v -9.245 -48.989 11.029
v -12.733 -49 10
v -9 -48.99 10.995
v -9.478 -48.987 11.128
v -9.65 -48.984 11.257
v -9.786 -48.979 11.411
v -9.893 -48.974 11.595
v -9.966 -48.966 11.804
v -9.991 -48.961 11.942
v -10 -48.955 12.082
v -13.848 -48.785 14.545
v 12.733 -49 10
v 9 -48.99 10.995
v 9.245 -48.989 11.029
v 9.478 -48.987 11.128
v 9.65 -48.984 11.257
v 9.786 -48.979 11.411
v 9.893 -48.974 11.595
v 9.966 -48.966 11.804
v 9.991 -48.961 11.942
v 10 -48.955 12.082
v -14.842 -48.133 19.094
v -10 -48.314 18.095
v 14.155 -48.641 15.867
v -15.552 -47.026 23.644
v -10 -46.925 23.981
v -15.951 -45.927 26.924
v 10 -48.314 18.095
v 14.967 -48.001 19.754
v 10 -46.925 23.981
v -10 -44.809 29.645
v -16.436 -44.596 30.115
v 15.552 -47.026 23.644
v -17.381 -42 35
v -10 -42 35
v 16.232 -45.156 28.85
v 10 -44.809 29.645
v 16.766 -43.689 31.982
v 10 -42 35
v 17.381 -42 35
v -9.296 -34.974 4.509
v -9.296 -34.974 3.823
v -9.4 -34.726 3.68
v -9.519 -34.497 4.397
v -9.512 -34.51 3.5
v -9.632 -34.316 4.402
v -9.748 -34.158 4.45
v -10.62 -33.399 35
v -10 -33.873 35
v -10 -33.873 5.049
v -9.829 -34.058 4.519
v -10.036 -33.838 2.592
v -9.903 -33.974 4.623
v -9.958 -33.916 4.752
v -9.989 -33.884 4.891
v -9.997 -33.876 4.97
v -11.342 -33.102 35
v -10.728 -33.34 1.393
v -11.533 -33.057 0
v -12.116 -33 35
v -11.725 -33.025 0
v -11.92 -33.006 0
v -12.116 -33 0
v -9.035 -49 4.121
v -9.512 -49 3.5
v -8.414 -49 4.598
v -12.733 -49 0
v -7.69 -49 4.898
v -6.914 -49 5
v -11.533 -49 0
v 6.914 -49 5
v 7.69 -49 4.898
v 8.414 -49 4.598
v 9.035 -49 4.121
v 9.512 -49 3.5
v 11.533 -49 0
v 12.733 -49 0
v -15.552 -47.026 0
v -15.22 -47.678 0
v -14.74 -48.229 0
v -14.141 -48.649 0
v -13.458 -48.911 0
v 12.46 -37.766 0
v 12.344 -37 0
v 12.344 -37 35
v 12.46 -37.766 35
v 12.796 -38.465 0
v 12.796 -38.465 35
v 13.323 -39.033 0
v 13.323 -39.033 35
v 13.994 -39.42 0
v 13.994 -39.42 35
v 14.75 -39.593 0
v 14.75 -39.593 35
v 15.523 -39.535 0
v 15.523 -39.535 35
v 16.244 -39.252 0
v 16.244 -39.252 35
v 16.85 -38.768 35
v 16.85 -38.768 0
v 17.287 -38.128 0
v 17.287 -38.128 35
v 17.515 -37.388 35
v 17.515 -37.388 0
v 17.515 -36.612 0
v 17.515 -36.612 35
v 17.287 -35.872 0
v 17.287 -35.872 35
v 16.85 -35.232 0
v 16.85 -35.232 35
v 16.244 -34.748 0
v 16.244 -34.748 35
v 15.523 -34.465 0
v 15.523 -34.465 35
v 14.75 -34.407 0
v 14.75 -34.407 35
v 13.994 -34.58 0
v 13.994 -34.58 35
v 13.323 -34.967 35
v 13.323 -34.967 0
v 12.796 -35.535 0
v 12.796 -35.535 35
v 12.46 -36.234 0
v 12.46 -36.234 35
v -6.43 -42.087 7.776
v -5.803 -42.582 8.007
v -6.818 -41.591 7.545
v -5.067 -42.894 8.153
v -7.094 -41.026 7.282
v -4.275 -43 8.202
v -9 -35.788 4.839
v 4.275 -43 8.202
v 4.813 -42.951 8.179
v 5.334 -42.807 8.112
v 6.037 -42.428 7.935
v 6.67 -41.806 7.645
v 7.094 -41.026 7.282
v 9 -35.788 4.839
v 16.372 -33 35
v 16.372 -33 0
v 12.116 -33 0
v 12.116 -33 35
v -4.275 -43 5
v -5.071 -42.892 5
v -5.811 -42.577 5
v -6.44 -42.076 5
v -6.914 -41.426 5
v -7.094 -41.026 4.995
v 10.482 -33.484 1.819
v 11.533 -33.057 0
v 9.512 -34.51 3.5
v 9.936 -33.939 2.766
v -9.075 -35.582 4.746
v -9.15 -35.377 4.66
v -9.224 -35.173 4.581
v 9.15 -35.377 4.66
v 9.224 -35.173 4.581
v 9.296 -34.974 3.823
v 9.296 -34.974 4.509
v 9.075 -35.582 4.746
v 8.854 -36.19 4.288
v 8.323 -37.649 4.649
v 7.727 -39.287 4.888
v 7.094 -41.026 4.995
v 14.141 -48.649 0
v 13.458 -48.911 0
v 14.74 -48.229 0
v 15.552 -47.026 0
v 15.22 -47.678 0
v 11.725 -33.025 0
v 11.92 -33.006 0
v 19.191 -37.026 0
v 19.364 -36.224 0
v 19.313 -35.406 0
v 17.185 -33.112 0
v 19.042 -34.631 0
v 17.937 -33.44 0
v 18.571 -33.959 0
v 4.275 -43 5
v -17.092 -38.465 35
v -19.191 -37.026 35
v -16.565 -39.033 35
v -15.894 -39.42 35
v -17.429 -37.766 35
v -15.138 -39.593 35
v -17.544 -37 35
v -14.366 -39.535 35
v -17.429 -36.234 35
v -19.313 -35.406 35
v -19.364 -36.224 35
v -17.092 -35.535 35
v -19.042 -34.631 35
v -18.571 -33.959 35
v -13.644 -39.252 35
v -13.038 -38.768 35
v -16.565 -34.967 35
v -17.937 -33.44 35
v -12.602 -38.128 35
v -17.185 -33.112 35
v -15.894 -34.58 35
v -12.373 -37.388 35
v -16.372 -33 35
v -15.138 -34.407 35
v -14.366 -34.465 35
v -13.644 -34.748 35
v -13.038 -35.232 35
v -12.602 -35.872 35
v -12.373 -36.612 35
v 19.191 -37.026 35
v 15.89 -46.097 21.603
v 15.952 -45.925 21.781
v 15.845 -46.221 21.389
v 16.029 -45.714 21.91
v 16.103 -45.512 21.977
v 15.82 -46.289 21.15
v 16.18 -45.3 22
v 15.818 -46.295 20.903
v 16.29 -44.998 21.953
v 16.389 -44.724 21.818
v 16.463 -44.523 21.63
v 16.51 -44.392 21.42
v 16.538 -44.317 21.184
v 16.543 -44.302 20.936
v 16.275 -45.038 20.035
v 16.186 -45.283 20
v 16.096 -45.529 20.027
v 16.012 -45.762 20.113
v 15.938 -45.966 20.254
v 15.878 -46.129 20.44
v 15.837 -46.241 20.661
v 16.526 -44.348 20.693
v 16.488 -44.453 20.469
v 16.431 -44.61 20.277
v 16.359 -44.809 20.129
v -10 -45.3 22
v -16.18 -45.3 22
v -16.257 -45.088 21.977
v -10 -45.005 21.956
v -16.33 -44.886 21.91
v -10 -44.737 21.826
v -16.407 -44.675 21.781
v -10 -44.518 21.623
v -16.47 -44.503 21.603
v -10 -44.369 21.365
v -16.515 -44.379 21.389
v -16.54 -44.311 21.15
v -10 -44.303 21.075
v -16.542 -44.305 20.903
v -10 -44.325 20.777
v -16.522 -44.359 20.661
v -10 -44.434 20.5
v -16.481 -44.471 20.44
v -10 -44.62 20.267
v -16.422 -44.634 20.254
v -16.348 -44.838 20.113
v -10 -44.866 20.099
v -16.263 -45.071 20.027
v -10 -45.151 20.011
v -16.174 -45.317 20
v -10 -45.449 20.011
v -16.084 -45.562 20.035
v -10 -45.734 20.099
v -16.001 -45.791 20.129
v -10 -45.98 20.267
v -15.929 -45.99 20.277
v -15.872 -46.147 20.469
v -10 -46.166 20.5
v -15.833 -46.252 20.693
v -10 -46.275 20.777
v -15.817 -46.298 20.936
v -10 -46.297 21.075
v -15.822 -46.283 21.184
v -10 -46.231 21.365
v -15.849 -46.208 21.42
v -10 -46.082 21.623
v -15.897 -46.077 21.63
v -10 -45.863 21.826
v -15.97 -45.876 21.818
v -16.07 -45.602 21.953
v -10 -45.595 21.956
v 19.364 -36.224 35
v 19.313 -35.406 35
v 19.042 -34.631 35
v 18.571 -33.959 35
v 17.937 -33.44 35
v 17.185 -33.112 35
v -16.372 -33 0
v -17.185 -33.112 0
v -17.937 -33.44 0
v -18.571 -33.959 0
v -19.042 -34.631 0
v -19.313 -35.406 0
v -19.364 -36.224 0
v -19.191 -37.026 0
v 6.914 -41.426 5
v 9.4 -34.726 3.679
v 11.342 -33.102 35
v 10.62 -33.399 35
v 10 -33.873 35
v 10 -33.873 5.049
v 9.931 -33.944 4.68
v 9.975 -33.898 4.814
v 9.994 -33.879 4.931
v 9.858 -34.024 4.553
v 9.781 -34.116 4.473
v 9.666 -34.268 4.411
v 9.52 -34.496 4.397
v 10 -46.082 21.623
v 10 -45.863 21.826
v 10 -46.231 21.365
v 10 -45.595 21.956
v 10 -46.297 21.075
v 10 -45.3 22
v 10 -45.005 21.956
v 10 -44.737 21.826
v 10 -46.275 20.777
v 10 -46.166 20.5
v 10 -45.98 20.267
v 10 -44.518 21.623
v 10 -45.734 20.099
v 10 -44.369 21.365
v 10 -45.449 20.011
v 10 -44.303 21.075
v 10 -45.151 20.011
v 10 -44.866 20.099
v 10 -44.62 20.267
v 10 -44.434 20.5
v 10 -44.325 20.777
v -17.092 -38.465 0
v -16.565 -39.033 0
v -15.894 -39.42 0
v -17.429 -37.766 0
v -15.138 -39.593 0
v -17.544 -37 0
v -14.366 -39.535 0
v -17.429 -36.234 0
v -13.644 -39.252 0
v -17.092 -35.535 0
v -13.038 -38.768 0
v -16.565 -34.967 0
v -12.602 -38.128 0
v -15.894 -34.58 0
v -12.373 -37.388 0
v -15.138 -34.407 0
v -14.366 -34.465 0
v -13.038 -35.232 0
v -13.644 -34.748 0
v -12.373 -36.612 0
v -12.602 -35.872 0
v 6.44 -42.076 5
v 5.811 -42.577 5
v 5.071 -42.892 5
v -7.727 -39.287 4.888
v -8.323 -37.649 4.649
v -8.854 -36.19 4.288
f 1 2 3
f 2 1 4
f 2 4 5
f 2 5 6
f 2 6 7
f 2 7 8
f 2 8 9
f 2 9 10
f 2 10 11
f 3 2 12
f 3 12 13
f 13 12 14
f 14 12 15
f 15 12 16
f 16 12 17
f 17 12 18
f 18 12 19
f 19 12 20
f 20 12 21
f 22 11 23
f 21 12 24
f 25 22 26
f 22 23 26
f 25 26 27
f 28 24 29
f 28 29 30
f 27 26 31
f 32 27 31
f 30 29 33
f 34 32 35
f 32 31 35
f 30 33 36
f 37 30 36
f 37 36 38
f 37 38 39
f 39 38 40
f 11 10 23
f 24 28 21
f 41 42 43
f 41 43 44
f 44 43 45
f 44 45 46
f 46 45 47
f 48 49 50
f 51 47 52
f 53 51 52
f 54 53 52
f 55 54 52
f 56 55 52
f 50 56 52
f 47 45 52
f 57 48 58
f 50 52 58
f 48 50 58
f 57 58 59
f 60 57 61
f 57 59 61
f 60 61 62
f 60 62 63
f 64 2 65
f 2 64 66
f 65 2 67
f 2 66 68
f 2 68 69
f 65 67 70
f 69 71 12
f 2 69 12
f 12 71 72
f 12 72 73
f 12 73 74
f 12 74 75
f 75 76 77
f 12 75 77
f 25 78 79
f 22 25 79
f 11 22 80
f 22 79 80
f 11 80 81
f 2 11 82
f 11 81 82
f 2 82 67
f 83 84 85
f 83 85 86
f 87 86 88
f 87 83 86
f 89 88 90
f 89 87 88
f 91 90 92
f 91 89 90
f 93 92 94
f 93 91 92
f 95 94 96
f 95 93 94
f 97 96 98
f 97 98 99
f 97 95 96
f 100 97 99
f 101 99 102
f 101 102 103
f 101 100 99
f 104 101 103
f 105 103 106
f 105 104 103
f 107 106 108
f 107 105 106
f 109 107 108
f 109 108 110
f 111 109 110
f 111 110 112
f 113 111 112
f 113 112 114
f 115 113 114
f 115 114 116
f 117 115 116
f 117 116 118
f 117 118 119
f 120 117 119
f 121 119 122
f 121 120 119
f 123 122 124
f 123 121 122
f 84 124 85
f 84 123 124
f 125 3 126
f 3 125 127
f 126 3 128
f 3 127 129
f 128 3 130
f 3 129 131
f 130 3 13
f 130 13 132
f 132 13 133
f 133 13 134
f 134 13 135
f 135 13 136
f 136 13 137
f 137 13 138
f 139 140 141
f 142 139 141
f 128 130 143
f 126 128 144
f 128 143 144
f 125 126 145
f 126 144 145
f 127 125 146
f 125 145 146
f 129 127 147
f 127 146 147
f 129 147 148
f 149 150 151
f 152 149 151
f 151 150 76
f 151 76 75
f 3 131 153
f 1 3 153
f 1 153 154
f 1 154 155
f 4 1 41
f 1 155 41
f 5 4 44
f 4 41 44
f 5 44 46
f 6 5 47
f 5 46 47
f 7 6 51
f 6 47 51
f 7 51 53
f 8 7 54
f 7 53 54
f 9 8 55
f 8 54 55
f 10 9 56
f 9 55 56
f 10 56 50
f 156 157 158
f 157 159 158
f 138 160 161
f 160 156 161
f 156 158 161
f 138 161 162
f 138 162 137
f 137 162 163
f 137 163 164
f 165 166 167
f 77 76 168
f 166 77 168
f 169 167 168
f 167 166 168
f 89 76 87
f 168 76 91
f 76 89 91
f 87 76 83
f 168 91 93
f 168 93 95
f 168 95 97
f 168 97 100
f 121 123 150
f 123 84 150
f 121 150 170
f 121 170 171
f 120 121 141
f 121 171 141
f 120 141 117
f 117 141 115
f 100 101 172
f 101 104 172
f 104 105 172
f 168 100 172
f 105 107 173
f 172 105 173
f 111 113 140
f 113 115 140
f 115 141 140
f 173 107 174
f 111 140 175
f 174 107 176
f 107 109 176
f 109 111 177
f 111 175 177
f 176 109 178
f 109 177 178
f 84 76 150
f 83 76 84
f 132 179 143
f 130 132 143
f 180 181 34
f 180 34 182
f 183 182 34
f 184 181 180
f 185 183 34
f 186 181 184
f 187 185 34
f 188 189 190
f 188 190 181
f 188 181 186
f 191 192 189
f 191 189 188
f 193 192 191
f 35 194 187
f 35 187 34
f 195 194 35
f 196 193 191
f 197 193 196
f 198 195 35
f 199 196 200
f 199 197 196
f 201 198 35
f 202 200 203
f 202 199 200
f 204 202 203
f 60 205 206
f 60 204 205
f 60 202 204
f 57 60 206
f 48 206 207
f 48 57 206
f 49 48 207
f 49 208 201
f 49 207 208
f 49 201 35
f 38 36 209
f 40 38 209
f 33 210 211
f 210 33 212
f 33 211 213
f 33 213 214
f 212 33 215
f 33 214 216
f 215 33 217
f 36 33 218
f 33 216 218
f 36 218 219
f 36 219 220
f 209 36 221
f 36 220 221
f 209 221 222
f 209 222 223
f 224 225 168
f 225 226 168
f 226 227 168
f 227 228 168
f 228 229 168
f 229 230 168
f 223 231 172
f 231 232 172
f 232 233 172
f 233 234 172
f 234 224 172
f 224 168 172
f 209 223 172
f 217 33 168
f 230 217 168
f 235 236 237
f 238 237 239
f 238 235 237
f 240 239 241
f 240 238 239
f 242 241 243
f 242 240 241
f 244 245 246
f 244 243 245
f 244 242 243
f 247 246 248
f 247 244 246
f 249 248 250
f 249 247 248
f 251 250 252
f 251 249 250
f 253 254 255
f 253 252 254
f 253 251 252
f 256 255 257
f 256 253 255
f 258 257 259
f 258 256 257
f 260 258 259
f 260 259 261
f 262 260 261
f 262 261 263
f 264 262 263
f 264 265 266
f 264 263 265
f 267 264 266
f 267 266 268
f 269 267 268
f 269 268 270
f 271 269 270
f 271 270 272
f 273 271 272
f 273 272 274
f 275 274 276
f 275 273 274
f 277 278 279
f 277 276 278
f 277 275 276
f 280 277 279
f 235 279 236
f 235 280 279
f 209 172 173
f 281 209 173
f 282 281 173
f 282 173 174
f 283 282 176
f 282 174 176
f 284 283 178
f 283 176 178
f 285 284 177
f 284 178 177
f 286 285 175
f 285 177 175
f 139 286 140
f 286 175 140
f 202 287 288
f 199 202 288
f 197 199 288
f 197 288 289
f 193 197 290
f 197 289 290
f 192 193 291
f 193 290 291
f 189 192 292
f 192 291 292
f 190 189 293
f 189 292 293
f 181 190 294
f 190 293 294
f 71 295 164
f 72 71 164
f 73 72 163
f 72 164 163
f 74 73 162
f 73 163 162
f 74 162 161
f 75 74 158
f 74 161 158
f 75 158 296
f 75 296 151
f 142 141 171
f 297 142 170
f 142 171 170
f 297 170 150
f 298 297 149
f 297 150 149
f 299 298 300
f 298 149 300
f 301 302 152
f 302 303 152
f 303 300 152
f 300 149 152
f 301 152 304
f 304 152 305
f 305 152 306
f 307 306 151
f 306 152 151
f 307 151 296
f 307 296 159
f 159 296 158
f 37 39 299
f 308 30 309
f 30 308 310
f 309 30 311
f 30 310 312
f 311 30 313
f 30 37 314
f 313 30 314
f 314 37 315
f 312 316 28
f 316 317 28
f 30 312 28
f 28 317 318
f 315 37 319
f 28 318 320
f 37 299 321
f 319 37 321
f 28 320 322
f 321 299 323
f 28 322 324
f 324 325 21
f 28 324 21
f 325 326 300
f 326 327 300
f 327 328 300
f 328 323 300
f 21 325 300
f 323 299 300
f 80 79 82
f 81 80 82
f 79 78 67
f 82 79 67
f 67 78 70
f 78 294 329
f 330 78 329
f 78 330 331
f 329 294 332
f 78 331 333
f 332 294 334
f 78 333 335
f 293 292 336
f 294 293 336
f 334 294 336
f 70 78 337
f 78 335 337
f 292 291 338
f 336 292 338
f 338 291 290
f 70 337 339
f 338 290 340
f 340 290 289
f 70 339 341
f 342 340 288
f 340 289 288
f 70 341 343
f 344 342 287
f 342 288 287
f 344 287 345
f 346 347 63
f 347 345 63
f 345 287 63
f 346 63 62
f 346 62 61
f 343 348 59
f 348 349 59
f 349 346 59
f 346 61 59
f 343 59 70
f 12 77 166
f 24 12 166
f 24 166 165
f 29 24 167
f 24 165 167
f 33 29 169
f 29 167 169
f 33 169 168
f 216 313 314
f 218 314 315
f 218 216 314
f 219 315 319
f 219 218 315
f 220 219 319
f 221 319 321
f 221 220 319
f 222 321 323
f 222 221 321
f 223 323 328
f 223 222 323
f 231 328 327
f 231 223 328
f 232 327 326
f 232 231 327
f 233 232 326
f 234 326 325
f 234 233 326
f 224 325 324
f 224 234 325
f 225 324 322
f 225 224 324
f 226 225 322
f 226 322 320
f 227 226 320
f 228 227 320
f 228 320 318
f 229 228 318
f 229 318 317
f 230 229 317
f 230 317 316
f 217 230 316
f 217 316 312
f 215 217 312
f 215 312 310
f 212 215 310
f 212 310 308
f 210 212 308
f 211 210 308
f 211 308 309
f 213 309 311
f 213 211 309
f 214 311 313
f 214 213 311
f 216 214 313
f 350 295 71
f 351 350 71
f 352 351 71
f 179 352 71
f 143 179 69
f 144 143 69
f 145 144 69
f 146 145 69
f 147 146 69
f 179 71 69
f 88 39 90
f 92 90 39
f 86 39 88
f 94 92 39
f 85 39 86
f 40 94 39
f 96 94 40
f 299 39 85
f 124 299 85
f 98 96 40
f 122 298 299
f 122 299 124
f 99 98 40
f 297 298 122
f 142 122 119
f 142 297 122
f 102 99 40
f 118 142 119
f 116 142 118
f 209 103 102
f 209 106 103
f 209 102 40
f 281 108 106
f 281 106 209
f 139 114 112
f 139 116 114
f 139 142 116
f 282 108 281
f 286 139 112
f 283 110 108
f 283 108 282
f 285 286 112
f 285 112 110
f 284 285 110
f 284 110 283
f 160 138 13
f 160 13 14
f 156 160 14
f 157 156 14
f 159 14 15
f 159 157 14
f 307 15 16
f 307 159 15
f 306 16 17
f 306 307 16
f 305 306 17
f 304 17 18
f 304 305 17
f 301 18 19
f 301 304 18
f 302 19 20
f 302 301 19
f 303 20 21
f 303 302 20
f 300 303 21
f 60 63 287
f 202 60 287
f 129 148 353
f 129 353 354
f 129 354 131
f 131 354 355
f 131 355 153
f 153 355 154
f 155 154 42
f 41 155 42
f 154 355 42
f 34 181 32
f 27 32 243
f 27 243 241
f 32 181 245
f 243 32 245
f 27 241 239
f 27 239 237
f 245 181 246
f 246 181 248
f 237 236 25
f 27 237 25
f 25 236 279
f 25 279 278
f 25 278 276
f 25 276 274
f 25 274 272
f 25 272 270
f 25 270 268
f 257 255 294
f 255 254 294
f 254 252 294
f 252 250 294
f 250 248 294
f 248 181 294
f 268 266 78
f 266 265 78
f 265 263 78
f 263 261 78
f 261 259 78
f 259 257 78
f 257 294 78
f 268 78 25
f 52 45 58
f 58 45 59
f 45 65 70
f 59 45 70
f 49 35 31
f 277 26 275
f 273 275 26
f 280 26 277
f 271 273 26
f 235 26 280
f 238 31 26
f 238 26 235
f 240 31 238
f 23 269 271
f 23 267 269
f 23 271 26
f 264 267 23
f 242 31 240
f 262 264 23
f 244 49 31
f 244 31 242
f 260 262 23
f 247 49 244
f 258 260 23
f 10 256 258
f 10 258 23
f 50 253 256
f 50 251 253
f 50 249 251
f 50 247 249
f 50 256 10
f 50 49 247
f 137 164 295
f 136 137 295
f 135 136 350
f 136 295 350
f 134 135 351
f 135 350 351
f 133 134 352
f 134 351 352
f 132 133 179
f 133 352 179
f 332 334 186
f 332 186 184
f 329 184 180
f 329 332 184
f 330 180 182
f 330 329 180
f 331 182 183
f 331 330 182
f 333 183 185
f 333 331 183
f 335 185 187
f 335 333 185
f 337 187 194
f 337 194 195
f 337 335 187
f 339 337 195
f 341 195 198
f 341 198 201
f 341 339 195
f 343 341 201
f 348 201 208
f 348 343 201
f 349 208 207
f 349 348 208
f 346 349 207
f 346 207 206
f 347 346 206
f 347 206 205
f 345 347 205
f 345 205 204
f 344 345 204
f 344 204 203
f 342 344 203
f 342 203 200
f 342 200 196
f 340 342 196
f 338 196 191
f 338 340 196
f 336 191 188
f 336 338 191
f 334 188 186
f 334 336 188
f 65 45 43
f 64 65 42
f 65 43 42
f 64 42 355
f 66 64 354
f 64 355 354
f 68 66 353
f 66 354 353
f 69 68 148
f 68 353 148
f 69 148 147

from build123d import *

# Parameters (mm, degrees)
SKETCH1_R               = 2.6
BOSS_EXTRUDE1_DEPTH     = 35
CUT_EXTRUDE3_DEPTH      = 10
CUT_EXTRUDE4_DEPTH      = 67.997971518
CUT_EXTRUDE4_DEPTH_BACK = 67.997971518
SKETCH5_R               = 1
CUT_EXTRUDE5_DEPTH      = 44.084608481
FILLET1_R               = 3
CUT_EXTRUDE6_DEPTH      = 67.997971643
CUT_EXTRUDE6_DEPTH_BACK = 67.997971643
FILLET2_R               = 1


with BuildPart() as part:
    # Sketch1 → Boss-Extrude1 (new body)
    with BuildSketch(Plane.XY):
        with BuildLine():
            Line((-19.191312838, -37.02606043), (-15.551610496, -47.02606043))
            ThreePointArc((-15.551610496, -47.02606043), (-14.453261942, -48.457456133), (-12.732532633, -49))
            Line((-12.732532633, -49), (12.732532633, -49))
            ThreePointArc((12.732532633, -49), (14.453261942, -48.457456133), (15.551610496, -47.02606043))
            Line((15.551610496, -47.02606043), (19.191312838, -37.02606043))
            ThreePointArc((19.191312838, -37.02606043), (18.829691109, -34.279270691), (16.372234976, -33))
            Line((16.372234976, -33), (12.115523886, -33))
            ThreePointArc((12.115523886, -33), (10.394794577, -33.542543867), (9.296446024, -34.97393957))
            Line((9.296446024, -34.97393957), (7.093654177, -41.02606043))
            ThreePointArc((7.093654177, -41.02606043), (5.995305623, -42.457456133), (4.274576314, -43))
            Line((4.274576314, -43), (-4.274576314, -43))
            ThreePointArc((-4.274576314, -43), (-5.995305623, -42.457456133), (-7.093654177, -41.02606043))
            Line((-7.093654177, -41.02606043), (-9.296446024, -34.97393957))
            ThreePointArc((-9.296446024, -34.97393957), (-10.394794577, -33.542543867), (-12.115523886, -33))
            Line((-12.115523886, -33), (-16.372234976, -33))
            ThreePointArc((-16.372234976, -33), (-18.829691109, -34.279270691), (-19.191312838, -37.02606043))
        make_face()
        with Locations(Location((-14.944086969, -37, 0), (0, 0, 180))):
            Circle(SKETCH1_R, mode=Mode.SUBTRACT)
        with Locations(Location((14.944086969, -37, 0), (0, 0, 180))):
            Circle(SKETCH1_R, mode=Mode.SUBTRACT)
    extrude(amount=BOSS_EXTRUDE1_DEPTH)

    # Sketch4 → Cut-Extrude3 (cut, symmetric)
    with BuildSketch(Plane(origin=(0, 0, 0), x_dir=(0, 0, -1), z_dir=(1, 0, 0))):
        Polygon((-35, -49), (-11, -49), (-3.53907747, -33), (-35, -33), align=None)
    extrude(amount=CUT_EXTRUDE3_DEPTH, both=True, mode=Mode.SUBTRACT)

    # Sketch5 → Cut-Extrude4 (cut, two sides: drawn at the far end of the back side and taken through both)
    with BuildSketch(Plane.ZY.offset(-10).offset(-CUT_EXTRUDE4_DEPTH_BACK)):
        with Locations((21, -45.3)):
            Circle(SKETCH5_R)
    extrude(amount=CUT_EXTRUDE4_DEPTH + CUT_EXTRUDE4_DEPTH_BACK, mode=Mode.SUBTRACT)

    # Sketch6 → Cut-Extrude5 (cut, through all)
    with BuildSketch(Plane.XZ.offset(49)):
        Polygon((-11.532532633, 0), (11.532532633, 0), (8.645781287, 5), (-8.645781287, 5), align=None)
    extrude(amount=-CUT_EXTRUDE5_DEPTH, mode=Mode.SUBTRACT)

    # Fillet1
    fillet1_edges = [part.edges().sort_by_distance(p)[0] for p in [
        (-8.645781287, -42.88081312, 5),
        (8.645781287, -42.88081312, 5),
    ]]
    fillet(fillet1_edges, radius=FILLET1_R)

    # Sketch7 → Cut-Extrude6 (cut, two sides: drawn at the far end of the back side and taken through both)
    with BuildSketch(Plane.ZY.offset(-10).offset(-CUT_EXTRUDE6_DEPTH_BACK)):
        with BuildLine():
            Line((35, -42), (35, -49))
            Line((35, -49), (10, -49))
            ThreePointArc((10, -49), (22.980754986, -47.216982092), (35, -42))
        make_face()
    extrude(amount=CUT_EXTRUDE6_DEPTH + CUT_EXTRUDE6_DEPTH_BACK, mode=Mode.SUBTRACT)

    # Fillet2
    fillet2_edges = [part.edges().sort_by_distance(p)[0] for p in [
        (-10, -41.431305772, 7.470659919),
        (10, -41.431305772, 7.470659919),
    ]]
    fillet(fillet2_edges, radius=FILLET2_R)


solid = part.part
